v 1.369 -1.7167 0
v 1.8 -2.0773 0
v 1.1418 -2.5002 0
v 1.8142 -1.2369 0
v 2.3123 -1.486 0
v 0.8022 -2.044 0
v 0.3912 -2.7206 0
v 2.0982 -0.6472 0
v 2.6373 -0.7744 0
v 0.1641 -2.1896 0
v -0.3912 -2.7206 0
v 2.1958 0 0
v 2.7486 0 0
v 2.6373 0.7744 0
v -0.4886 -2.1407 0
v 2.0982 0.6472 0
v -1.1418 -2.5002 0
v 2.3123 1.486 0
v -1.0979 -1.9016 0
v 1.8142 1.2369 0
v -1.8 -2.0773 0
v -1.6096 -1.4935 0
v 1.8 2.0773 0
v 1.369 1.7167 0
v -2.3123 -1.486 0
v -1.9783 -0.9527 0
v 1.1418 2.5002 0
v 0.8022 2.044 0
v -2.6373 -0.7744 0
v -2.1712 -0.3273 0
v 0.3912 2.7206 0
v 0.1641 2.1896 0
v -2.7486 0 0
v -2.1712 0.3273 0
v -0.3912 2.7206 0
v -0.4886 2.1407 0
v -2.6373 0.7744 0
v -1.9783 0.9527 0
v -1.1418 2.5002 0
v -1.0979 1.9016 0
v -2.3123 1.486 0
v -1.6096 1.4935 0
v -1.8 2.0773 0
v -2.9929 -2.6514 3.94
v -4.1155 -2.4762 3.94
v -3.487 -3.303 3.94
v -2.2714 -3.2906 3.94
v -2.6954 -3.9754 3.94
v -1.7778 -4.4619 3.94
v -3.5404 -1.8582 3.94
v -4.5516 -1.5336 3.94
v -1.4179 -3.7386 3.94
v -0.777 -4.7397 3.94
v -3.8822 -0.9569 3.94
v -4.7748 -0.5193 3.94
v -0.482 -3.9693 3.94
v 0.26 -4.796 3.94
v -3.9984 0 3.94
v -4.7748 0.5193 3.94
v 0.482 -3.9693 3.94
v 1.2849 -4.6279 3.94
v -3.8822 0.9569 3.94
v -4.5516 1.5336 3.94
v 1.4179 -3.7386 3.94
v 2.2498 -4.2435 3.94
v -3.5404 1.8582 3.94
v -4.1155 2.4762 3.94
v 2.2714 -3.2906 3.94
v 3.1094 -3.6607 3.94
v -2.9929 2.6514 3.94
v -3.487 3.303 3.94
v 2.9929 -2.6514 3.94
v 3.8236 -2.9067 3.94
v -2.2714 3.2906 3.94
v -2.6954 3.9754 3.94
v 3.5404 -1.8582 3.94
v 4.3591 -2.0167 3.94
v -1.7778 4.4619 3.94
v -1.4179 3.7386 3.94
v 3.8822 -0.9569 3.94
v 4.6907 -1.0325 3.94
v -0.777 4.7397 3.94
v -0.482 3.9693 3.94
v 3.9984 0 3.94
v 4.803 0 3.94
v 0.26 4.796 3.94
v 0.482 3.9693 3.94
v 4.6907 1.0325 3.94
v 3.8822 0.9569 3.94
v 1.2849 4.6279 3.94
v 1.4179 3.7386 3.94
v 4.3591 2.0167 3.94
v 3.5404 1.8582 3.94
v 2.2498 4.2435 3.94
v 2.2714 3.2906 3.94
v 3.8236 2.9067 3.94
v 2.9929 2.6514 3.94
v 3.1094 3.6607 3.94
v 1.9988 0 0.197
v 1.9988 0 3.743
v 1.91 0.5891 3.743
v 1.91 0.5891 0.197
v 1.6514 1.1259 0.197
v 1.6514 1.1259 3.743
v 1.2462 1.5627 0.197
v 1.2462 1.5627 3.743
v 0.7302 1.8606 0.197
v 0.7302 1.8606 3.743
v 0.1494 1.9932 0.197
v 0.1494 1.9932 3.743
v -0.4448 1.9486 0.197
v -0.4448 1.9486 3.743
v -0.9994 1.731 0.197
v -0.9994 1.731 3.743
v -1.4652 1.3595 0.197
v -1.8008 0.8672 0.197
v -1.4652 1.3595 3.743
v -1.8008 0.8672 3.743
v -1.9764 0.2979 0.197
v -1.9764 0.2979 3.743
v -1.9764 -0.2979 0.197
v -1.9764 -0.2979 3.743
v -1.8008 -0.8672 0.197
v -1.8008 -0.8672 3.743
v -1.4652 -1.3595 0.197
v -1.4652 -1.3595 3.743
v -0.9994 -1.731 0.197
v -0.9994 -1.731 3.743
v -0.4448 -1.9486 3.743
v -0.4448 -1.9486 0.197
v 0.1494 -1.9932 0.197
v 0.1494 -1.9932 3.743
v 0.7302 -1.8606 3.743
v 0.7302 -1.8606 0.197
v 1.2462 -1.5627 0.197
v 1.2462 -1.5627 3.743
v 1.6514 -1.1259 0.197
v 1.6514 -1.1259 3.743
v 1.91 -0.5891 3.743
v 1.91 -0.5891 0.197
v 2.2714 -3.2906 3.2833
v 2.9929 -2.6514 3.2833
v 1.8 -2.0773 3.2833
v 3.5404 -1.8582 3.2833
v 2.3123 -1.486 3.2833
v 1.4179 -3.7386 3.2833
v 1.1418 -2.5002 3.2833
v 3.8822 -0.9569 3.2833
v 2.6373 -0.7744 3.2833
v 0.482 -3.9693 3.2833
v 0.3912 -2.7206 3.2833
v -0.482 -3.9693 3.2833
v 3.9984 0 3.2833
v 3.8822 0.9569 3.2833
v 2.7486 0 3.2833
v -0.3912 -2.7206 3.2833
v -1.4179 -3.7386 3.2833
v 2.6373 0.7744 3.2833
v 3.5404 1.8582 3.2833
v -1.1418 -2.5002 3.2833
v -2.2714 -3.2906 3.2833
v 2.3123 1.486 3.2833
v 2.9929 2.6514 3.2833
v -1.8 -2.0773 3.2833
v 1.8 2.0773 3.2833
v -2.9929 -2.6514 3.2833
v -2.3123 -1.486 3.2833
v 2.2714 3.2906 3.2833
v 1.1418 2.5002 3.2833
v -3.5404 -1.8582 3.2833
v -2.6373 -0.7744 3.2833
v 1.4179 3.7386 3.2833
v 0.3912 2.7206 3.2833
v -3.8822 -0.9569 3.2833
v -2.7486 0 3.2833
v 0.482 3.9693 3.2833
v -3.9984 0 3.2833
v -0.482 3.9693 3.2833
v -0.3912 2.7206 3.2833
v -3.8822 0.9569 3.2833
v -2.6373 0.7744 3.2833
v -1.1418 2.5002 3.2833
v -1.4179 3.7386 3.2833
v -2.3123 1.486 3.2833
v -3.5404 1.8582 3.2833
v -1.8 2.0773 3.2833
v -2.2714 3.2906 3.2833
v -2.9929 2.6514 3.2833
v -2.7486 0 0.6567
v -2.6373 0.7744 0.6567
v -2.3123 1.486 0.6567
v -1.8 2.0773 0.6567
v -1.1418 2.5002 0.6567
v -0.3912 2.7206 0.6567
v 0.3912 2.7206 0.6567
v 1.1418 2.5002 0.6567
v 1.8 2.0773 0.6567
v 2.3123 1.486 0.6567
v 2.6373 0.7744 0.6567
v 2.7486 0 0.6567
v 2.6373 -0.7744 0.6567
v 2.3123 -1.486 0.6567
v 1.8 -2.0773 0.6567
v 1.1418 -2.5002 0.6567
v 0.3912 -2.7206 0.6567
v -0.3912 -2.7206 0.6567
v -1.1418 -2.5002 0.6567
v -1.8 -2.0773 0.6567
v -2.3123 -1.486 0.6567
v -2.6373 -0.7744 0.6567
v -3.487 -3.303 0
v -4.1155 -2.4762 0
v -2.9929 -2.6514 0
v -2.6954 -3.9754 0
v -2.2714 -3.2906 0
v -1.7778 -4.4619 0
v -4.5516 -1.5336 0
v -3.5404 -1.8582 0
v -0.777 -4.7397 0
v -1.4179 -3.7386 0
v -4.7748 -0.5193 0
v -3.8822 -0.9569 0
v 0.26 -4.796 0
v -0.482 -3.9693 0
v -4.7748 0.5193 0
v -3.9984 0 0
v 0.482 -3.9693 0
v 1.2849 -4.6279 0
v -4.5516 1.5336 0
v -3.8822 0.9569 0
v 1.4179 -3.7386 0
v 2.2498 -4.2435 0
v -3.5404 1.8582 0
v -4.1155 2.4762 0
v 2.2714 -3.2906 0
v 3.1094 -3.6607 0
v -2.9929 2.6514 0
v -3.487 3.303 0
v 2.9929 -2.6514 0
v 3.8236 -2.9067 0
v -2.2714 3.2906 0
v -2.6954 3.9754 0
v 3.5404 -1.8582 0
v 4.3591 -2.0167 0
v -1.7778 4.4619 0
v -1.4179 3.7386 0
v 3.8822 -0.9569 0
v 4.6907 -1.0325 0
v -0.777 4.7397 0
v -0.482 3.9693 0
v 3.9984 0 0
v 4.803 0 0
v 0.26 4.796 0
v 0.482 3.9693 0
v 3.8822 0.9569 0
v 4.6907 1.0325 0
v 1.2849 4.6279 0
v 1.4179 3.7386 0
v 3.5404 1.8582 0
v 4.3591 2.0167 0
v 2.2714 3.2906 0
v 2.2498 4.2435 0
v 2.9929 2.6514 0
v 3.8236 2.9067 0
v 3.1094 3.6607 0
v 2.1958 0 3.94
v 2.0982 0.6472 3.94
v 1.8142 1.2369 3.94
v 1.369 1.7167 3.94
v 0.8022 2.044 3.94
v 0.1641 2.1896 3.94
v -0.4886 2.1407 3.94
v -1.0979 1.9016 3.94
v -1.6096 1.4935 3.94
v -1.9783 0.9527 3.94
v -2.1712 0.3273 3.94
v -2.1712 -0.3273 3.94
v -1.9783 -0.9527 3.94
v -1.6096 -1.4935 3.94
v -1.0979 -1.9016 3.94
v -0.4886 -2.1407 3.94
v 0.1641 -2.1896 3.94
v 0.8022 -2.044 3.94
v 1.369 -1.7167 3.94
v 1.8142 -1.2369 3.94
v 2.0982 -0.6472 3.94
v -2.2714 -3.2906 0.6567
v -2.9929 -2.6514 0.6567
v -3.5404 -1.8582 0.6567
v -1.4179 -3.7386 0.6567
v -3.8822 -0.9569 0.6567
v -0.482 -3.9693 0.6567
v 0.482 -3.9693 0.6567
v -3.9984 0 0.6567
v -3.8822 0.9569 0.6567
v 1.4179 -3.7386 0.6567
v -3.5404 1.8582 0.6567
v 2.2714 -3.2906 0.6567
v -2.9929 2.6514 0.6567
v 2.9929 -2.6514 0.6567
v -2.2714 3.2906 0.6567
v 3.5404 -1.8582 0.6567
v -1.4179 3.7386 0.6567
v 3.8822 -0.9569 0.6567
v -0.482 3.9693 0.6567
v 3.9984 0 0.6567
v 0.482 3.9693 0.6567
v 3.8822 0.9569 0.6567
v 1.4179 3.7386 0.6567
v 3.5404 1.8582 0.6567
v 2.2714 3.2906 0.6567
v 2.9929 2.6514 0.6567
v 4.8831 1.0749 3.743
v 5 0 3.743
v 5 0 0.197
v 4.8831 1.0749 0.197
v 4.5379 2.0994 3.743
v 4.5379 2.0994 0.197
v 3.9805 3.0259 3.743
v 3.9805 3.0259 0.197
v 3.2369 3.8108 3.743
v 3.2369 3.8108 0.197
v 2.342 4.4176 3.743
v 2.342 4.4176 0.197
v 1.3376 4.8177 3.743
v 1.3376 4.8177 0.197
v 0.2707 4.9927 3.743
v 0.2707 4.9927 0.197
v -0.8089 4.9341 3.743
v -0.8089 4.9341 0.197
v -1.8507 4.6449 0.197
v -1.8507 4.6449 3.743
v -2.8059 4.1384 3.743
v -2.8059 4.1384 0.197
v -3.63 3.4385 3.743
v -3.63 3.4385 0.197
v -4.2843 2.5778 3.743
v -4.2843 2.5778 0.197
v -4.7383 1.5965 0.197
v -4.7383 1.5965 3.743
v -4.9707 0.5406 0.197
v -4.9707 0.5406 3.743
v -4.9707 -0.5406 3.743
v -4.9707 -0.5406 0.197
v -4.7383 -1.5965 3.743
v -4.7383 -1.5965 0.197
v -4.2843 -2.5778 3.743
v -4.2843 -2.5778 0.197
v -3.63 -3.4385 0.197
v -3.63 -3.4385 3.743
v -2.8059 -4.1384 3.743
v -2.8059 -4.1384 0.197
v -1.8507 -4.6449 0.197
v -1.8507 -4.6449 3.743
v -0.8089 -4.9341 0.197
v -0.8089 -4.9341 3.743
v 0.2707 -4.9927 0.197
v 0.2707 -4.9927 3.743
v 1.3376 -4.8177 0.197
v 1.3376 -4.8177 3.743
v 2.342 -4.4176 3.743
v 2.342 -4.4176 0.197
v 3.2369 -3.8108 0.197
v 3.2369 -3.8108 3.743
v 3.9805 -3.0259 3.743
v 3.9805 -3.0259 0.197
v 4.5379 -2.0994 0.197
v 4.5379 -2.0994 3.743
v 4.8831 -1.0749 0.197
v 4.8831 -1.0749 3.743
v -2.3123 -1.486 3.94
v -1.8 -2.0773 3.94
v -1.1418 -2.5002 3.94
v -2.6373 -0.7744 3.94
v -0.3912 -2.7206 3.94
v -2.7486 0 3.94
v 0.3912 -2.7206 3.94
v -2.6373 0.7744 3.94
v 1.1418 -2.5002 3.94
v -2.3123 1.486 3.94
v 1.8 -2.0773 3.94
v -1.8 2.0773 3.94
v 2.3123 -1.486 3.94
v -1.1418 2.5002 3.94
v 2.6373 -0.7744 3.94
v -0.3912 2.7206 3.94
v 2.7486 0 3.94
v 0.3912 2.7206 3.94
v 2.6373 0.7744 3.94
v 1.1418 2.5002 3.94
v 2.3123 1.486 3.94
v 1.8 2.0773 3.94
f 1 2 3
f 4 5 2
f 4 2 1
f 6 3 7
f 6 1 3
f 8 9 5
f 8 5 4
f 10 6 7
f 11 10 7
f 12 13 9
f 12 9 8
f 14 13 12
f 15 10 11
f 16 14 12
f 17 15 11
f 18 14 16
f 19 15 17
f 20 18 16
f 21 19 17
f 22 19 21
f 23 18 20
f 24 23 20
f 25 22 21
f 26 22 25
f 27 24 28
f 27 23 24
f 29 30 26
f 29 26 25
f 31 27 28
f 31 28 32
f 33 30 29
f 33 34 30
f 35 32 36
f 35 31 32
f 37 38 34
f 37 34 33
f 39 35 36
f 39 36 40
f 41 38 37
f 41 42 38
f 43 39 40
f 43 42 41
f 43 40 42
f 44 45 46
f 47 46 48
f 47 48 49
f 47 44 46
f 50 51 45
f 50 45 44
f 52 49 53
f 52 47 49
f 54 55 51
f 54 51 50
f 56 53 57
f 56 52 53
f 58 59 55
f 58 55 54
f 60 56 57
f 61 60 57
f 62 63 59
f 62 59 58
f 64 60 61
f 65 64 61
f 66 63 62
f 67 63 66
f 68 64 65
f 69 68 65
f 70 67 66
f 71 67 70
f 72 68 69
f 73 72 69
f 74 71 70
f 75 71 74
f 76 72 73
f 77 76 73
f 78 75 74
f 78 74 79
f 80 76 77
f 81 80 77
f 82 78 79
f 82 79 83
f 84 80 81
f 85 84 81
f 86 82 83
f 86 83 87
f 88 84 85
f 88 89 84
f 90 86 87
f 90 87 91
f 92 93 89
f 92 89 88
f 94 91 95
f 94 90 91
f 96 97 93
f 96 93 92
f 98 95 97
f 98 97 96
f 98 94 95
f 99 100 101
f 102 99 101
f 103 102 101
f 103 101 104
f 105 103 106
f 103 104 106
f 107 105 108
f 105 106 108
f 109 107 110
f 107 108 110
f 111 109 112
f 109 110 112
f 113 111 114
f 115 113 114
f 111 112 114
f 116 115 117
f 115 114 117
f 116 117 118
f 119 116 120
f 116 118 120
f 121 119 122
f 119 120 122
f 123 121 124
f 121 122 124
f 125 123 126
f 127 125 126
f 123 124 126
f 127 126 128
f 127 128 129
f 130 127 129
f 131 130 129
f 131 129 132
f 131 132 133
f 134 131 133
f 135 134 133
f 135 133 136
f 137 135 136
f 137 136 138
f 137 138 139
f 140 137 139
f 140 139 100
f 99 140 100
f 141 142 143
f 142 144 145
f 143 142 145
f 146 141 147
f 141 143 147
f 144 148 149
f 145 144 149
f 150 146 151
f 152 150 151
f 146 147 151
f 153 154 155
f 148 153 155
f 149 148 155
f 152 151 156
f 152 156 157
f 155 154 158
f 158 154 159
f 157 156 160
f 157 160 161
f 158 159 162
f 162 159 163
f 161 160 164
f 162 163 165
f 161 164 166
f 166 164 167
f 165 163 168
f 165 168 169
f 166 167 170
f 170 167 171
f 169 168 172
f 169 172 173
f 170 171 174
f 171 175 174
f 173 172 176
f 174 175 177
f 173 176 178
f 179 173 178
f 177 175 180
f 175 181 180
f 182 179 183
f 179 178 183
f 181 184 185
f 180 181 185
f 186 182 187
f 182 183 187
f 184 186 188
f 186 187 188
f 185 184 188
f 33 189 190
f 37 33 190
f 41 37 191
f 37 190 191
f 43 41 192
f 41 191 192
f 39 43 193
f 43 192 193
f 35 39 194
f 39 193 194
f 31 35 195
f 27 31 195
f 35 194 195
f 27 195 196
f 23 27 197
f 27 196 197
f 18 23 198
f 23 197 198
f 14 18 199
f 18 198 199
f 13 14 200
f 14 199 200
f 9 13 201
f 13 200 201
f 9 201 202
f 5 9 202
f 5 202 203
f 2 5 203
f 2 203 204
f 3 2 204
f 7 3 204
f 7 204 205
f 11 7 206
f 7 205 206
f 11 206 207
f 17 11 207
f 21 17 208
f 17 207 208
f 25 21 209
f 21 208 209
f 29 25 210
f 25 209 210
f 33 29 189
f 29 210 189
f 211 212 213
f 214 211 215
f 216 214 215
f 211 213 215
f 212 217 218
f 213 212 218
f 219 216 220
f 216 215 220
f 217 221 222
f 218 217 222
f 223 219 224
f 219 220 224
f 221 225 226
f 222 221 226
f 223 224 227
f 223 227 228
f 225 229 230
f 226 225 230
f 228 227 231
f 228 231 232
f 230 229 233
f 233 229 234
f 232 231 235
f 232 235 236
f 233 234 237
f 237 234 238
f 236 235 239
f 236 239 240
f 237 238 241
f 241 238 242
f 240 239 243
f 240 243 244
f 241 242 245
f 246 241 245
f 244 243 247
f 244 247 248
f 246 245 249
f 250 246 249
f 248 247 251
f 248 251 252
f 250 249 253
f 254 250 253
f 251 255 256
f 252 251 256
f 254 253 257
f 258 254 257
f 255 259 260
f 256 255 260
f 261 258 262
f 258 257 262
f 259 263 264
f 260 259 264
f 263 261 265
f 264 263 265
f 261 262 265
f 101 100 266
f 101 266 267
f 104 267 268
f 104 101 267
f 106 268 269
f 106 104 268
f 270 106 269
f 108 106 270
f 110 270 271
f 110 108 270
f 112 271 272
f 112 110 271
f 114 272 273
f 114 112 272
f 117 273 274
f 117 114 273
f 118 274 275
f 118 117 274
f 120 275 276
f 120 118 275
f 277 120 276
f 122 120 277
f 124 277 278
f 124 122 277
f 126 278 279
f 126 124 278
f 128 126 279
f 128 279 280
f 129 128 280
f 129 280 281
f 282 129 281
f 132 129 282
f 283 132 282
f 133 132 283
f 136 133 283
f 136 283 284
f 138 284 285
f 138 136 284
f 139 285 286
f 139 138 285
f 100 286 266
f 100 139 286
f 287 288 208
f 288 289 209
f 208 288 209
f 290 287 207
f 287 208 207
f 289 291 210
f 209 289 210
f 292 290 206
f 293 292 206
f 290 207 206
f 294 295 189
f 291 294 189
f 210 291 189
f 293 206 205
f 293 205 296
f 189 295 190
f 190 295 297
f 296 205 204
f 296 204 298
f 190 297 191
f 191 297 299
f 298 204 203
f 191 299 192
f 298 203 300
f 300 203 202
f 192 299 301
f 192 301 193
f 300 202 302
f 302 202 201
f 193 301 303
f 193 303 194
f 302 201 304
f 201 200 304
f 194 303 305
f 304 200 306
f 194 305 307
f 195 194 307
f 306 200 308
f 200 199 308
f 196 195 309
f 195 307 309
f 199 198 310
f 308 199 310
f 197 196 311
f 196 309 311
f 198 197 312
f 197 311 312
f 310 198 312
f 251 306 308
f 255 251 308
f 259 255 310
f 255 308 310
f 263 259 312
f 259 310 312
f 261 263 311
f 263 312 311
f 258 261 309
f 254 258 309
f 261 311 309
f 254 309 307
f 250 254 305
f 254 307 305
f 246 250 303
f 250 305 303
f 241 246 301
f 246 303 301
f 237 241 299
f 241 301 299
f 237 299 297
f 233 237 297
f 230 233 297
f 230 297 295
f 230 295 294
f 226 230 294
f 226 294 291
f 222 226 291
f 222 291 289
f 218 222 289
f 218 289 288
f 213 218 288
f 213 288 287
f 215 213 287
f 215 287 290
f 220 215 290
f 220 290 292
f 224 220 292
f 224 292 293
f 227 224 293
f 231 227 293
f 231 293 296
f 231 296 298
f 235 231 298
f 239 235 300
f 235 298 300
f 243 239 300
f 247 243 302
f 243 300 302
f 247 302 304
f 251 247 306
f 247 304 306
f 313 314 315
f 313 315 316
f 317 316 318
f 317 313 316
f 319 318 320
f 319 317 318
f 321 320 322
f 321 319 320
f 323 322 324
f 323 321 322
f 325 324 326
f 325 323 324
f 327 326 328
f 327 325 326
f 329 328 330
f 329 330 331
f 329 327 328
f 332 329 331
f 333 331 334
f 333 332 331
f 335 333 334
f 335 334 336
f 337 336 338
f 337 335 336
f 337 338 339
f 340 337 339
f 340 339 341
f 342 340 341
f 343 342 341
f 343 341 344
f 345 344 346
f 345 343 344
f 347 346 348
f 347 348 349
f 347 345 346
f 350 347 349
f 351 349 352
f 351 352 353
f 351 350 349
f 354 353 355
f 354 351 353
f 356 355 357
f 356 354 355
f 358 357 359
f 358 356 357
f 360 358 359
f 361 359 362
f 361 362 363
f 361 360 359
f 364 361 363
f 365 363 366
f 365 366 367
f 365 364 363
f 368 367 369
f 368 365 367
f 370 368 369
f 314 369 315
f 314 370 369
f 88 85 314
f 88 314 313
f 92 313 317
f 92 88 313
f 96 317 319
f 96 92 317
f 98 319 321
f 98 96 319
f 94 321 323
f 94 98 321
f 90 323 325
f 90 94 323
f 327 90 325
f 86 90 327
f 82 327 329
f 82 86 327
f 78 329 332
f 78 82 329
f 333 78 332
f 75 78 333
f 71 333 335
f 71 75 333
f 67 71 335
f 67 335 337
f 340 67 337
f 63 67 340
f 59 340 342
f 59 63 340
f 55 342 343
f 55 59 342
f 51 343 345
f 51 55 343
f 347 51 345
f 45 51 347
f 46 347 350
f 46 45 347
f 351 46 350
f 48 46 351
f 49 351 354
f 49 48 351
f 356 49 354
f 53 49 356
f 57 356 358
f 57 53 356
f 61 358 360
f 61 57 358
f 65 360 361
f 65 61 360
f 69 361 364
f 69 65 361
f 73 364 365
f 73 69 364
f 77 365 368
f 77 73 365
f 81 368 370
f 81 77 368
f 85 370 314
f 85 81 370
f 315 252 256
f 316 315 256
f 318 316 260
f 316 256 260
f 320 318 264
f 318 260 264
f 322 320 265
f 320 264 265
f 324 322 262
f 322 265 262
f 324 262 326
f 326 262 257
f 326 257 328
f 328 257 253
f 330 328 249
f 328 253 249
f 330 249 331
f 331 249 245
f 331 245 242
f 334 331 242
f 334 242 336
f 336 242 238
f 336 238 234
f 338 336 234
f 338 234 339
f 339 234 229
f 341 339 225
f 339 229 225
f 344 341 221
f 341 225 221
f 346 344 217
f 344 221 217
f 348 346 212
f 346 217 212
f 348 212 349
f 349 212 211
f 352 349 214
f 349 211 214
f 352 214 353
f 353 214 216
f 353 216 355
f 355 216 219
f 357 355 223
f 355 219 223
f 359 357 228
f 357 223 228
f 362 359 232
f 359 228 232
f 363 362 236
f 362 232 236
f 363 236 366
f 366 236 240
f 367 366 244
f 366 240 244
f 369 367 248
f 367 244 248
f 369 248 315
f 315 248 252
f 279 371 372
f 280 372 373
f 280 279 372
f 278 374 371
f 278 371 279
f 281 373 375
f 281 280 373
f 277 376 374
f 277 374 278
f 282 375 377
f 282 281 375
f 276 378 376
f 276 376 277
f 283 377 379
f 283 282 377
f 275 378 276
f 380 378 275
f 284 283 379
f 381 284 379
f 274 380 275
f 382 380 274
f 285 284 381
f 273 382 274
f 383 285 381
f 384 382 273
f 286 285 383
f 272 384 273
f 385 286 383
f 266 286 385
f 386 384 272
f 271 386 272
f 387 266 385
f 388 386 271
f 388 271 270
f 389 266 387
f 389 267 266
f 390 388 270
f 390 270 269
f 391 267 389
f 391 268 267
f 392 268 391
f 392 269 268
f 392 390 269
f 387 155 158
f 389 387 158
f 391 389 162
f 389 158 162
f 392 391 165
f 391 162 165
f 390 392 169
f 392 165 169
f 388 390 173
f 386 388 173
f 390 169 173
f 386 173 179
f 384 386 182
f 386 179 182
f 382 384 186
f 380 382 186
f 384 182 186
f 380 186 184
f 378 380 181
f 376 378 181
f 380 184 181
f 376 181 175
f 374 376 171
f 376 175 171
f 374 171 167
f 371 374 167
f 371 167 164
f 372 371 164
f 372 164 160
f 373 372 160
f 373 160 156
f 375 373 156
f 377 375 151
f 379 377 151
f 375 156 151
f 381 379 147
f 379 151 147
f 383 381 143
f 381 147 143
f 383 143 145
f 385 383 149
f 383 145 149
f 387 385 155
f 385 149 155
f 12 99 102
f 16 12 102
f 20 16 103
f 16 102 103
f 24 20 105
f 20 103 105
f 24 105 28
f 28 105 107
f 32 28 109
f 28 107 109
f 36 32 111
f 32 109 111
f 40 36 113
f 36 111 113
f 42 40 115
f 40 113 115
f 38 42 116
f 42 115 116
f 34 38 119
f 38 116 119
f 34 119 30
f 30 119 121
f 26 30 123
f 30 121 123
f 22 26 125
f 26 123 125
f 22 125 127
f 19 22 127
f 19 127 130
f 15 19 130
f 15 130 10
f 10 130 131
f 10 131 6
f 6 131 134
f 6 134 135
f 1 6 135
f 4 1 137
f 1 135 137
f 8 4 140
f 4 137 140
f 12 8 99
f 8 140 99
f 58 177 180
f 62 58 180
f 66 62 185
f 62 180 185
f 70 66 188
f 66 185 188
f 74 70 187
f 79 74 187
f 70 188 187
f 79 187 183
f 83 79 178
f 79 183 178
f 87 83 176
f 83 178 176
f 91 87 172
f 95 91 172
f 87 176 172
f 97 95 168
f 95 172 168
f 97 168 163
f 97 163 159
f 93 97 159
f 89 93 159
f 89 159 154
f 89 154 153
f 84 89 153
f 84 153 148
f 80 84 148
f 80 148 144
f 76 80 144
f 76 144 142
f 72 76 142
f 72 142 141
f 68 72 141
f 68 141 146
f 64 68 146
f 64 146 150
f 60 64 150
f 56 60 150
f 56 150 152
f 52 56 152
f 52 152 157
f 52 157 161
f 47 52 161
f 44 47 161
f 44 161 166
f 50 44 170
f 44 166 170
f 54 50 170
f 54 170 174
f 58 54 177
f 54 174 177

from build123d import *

# Parameters (mm, degrees)
SKETCH1_R      = 5
EXTRUDE1_DEPTH = 3.94
HOLE1_D        = 7.996833333
HOLE1_DEPTH    = 0.656666667
SKETCH4_R      = 2.748625
EXTRUDE2_DEPTH = 0.656666667
HOLE2_D        = 7.996833333
HOLE2_DEPTH    = 0.656666667
SKETCH7_R      = 2.748625
EXTRUDE3_DEPTH = 0.656666667
HOLE3_D        = 3.9975
HOLE3_DEPTH    = 3.94
CHAMFER1_SIZE  = 0.197


with BuildPart() as part:
    # Sketch1 → Extrude1 (new body)
    with BuildSketch(Plane.XY.offset(3.94)):
        Circle(SKETCH1_R)
    extrude(amount=-EXTRUDE1_DEPTH)

    # Hole1
    with Locations(Plane.XY.offset(3.94)):
        with Locations((0, 0)):
            Hole(HOLE1_D / 2, depth=HOLE1_DEPTH)

    # Sketch4 → Extrude2 (add)
    with BuildSketch(Plane.XY.offset(3.283333333)):
        Circle(SKETCH4_R)
    extrude(amount=EXTRUDE2_DEPTH)

    # Hole2
    with Locations(Plane(origin=(0, 0, 0), x_dir=(-1, 0, 0), z_dir=(0, 0, -1))):
        with Locations((0, 0)):
            Hole(HOLE2_D / 2, depth=HOLE2_DEPTH)

    # Sketch7 → Extrude3 (add)
    with BuildSketch(Plane(origin=(0, 0, 0.656666667), x_dir=(-1, 0, 0), z_dir=(0, 0, -1))):
        Circle(SKETCH7_R)
    extrude(amount=EXTRUDE3_DEPTH)

    # Hole3
    with Locations(Plane(origin=(0, 0, 0), x_dir=(-1, 0, 0), z_dir=(0, 0, -1))):
        with Locations((0, 0)):
            Hole(HOLE3_D / 2, depth=HOLE3_DEPTH)

    # Chamfer1
    chamfer1_edges = [part.edges().sort_by_distance(p)[0] for p in [
        (-5, 0, 3.94),
        (-1.99875, 0, 0),
        (-1.99875, 0, 3.94),
        (-5, 0, 0),
    ]]
    chamfer(chamfer1_edges, length=CHAMFER1_SIZE)


solid = part.part
